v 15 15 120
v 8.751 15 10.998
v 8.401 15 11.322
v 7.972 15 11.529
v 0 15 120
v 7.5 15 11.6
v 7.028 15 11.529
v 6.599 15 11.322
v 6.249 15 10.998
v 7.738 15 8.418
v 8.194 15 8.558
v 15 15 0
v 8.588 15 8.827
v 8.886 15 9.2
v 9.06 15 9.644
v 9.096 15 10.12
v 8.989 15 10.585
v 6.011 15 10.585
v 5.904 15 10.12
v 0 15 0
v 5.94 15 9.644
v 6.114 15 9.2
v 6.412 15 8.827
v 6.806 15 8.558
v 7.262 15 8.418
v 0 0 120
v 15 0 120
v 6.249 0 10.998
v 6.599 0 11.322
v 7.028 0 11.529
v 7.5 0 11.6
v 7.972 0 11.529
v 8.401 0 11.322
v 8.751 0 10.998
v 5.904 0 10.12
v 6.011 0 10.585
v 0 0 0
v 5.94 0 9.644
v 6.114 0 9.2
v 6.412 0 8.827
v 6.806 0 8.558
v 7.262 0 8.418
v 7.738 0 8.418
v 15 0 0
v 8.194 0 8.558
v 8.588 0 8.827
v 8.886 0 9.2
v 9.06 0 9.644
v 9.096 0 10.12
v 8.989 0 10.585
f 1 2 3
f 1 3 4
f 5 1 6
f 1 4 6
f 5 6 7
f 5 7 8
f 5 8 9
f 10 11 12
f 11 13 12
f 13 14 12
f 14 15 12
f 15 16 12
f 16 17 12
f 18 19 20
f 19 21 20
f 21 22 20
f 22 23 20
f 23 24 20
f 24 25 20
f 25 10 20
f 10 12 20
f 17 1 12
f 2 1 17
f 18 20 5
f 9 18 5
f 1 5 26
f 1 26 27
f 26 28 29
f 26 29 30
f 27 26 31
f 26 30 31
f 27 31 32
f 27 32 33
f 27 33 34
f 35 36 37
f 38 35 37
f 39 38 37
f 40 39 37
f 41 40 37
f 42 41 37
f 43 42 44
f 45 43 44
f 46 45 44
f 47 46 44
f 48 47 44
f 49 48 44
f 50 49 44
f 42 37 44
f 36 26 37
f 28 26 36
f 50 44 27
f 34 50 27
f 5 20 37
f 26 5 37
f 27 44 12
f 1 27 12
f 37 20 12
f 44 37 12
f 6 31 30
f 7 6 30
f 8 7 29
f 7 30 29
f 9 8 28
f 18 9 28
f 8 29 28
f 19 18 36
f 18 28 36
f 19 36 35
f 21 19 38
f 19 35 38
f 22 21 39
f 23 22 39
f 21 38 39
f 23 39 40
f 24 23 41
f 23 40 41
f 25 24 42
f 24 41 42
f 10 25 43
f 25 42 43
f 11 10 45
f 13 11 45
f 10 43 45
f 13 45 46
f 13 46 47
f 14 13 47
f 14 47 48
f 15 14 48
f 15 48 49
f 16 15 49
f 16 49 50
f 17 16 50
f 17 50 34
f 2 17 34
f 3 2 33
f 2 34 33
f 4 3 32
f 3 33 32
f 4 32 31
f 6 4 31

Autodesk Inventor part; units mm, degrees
ref_plane "YZ Plane" through (0, 0, 0) normal (1, 0, 0) x (0, 1, 0)
ref_plane "XZ Plane" through (0, 0, 0) normal (0, 1, 0) x (-1, 0, 0)
ref_plane "XY Plane" through (0, 0, 0) normal (0, 0, 1) x (1, 0, 0)
sketch "スケッチ1" plane through (0, 0, 0) normal (0, 0, 1) x (1, 0, 0)
  line L0 (0, 0) -> (15, 0)
  line L1 (15, 0) -> (15, 15)
  line L2 (15, 15) -> (0, 15)
  line L3 (0, 15) -> (0, 0)
  dimension "d0" = 15
  dimension "d1" = 15
extrude "押し出し1" add sketch "スケッチ1" along normal blind 120
sketch "スケッチ2" plane through (0, 15, 0) normal (0, 1, 0) x (1, 0, 0)
  line L0 (15, 0) -> (0, 0) projected
  line L1 (15, 0) -> (15, -120) projected
  point P0 (7.5, -10)
  dimension "d4" = 10
  dimension "d5" = 7.5
hole "穴1" at (7.5, 15, 10) direction (0, -1, 0) diameter 3.2 end through all
properties part number "射出_角柱7"
